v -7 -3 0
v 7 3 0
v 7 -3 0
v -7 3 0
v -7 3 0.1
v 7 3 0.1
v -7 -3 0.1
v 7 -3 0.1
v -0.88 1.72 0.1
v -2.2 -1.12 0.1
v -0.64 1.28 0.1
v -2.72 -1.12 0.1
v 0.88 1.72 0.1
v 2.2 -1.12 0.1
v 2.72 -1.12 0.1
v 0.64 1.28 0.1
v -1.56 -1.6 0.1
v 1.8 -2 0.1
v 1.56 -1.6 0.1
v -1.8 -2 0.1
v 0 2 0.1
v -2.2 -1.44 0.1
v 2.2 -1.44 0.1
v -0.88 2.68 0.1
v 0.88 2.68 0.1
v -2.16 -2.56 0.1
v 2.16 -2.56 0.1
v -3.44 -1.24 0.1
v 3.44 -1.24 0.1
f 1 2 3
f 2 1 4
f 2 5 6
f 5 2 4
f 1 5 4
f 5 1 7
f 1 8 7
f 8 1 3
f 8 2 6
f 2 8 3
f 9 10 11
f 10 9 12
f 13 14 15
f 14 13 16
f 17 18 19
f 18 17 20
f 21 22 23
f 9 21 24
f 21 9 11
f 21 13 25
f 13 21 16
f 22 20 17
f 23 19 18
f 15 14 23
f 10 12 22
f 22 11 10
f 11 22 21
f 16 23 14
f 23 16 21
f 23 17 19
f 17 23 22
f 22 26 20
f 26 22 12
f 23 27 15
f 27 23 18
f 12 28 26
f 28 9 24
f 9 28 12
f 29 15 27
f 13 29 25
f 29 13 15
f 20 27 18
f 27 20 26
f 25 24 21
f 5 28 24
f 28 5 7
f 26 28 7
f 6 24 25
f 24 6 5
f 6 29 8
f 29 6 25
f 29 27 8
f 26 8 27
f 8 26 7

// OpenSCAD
// file: ../p/4-4edge.scad
use <../lib.scad>
$fa=1; $fs=0.2;
function ldraw_lib__4_4edge(realsolid=false) = [
// 0 Circle 1.0
// 0 Name: 4-4edge.dat
// 0 Author: James Jessiman
// 0 !LDRAW_ORG Primitive UPDATE 2017-01
// 0 !LICENSE Licensed under CC BY 2.0 and CC BY 4.0 : see CAreadme.txt
// 
// 0 BFC CERTIFY CCW
  [0,"BFC","CERTIFY"],
  [0,"BFC","CCW"],
// 
// 0 !HISTORY 1998-12-15 [PTadmin] Official Update 1998-10
// 0 !HISTORY 2005-12-28 [PTadmin] Official Update 2005-01
// 0 !HISTORY 2007-06-24 [PTadmin] Header formatted for Contributor Agreement
// 0 !HISTORY 2008-07-01 [PTadmin] Official Update 2008-01
// 0 !HISTORY 2017-01-15 [Steffen] BFCed
// 0 !HISTORY 2017-12-30 [PTadmin] Official Update 2017-01
// 
// 
// 2 24 1 0 0 0.9239 0 0.3827
  [2,24,1,0,0,0.9239,0,0.3827],
// 2 24 0.9239 0 0.3827 0.7071 0 0.7071
  [2,24,0.9239,0,0.3827,0.7071,0,0.7071],
// 2 24 0.7071 0 0.7071 0.3827 0 0.9239
  [2,24,0.7071,0,0.7071,0.3827,0,0.9239],
// 2 24 0.3827 0 0.9239 0 0 1
  [2,24,0.3827,0,0.9239,0,0,1],
// 2 24 0 0 1 -0.3827 0 0.9239
  [2,24,0,0,1,-0.3827,0,0.9239],
// 2 24 -0.3827 0 0.9239 -0.7071 0 0.7071
  [2,24,-0.3827,0,0.9239,-0.7071,0,0.7071],
// 2 24 -0.7071 0 0.7071 -0.9239 0 0.3827
  [2,24,-0.7071,0,0.7071,-0.9239,0,0.3827],
// 2 24 -0.9239 0 0.3827 -1 0 -0
  [2,24,-0.9239,0,0.3827,-1,0,-0],
// 2 24 -1 0 -0 -0.9239 0 -0.3827
  [2,24,-1,0,-0,-0.9239,0,-0.3827],
// 2 24 -0.9239 0 -0.3827 -0.7071 0 -0.7071
  [2,24,-0.9239,0,-0.3827,-0.7071,0,-0.7071],
// 2 24 -0.7071 0 -0.7071 -0.3827 0 -0.9239
  [2,24,-0.7071,0,-0.7071,-0.3827,0,-0.9239],
// 2 24 -0.3827 0 -0.9239 0 0 -1
  [2,24,-0.3827,0,-0.9239,0,0,-1],
// 2 24 0 0 -1 0.3827 0 -0.9239
  [2,24,0,0,-1,0.3827,0,-0.9239],
// 2 24 0.3827 0 -0.9239 0.7071 0 -0.7071
  [2,24,0.3827,0,-0.9239,0.7071,0,-0.7071],
// 2 24 0.7071 0 -0.7071 0.9239 0 -0.3827
  [2,24,0.7071,0,-0.7071,0.9239,0,-0.3827],
// 2 24 0.9239 0 -0.3827 1 0 0
  [2,24,0.9239,0,-0.3827,1,0,0],
];
module ldraw_lib__4_4edge(step=0, col=false, unit=2/5, alt=false, line=0.2, solid=!$preview)
    makepoly(ldraw_lib__4_4edge(solid), step=step, col=col, unit=unit, alt=alt, line=line, solid=solid);
ldraw_lib__4_4edge(line=0.2);
// file: ../p/4-4disc.scad
use <../lib.scad>
$fa=1; $fs=0.2;
function ldraw_lib__4_4disc(realsolid=false) = [
// 0 Disc 1.0
// 0 Name: 4-4disc.dat
// 0 Author: James Jessiman
// 0 !LDRAW_ORG Primitive UPDATE 2002-02
// 0 !LICENSE Licensed under CC BY 2.0 and CC BY 4.0 : see CAreadme.txt
// 
// 0 BFC CERTIFY CCW
  [0,"BFC","CERTIFY"],
  [0,"BFC","CCW"],
// 
// 0 !HISTORY 1998-12-15 [PTadmin] Official Update 1998-10
// 0 !HISTORY 2002-03-23 [sbliss] Added BFC statement
// 0 !HISTORY 2002-04-25 [PTadmin] Official Update 2002-02
// 0 !HISTORY 2007-06-24 [PTadmin] Header formatted for Contributor Agreement
// 0 !HISTORY 2008-07-01 [PTadmin] Official Update 2008-01
// 
// 
// 3 16 0 0 0 1 0 0 0.9239 0 0.3827
  [3,16,0,0,0,1,0,0,0.9239,0,0.3827],
// 3 16 0 0 0 0.9239 0 0.3827 0.7071 0 0.7071
  [3,16,0,0,0,0.9239,0,0.3827,0.7071,0,0.7071],
// 3 16 0 0 0 0.7071 0 0.7071 0.3827 0 0.9239
  [3,16,0,0,0,0.7071,0,0.7071,0.3827,0,0.9239],
// 3 16 0 0 0 0.3827 0 0.9239 0 0 1
  [3,16,0,0,0,0.3827,0,0.9239,0,0,1],
// 3 16 0 0 0 0 0 1 -0.3827 0 0.9239
  [3,16,0,0,0,0,0,1,-0.3827,0,0.9239],
// 3 16 0 0 0 -0.3827 0 0.9239 -0.7071 0 0.7071
  [3,16,0,0,0,-0.3827,0,0.9239,-0.7071,0,0.7071],
// 3 16 0 0 0 -0.7071 0 0.7071 -0.9239 0 0.3827
  [3,16,0,0,0,-0.7071,0,0.7071,-0.9239,0,0.3827],
// 3 16 0 0 0 -0.9239 0 0.3827 -1 0 -0
  [3,16,0,0,0,-0.9239,0,0.3827,-1,0,-0],
// 3 16 0 0 0 -1 0 -0 -0.9239 0 -0.3827
  [3,16,0,0,0,-1,0,-0,-0.9239,0,-0.3827],
// 3 16 0 0 0 -0.9239 0 -0.3827 -0.7071 0 -0.7071
  [3,16,0,0,0,-0.9239,0,-0.3827,-0.7071,0,-0.7071],
// 3 16 0 0 0 -0.7071 0 -0.7071 -0.3827 0 -0.9239
  [3,16,0,0,0,-0.7071,0,-0.7071,-0.3827,0,-0.9239],
// 3 16 0 0 0 -0.3827 0 -0.9239 0 0 -1
  [3,16,0,0,0,-0.3827,0,-0.9239,0,0,-1],
// 3 16 0 0 0 0 0 -1 0.3827 0 -0.9239
  [3,16,0,0,0,0,0,-1,0.3827,0,-0.9239],
// 3 16 0 0 0 0.3827 0 -0.9239 0.7071 0 -0.7071
  [3,16,0,0,0,0.3827,0,-0.9239,0.7071,0,-0.7071],
// 3 16 0 0 0 0.7071 0 -0.7071 0.9239 0 -0.3827
  [3,16,0,0,0,0.7071,0,-0.7071,0.9239,0,-0.3827],
// 3 16 0 0 0 0.9239 0 -0.3827 1 0 0
  [3,16,0,0,0,0.9239,0,-0.3827,1,0,0],
// 0
];
module ldraw_lib__4_4disc(step=0, col=false, unit=2/5, alt=false, line=0.2, solid=!$preview)
    makepoly(ldraw_lib__4_4disc(solid), step=step, col=col, unit=unit, alt=alt, line=line, solid=solid);
ldraw_lib__4_4disc(line=0.2);
// file: ../p/4-4cyli.scad
use <../lib.scad>
$fa=1; $fs=0.2;
function ldraw_lib__4_4cyli(realsolid=false) = [
// 0 Cylinder 1.0
// 0 Name: 4-4cyli.dat
// 0 Author: James Jessiman
// 0 !LDRAW_ORG Primitive UPDATE 2005-01
// 0 !LICENSE Licensed under CC BY 2.0 and CC BY 4.0 : see CAreadme.txt
// 
// 0 BFC CERTIFY CCW
  [0,"BFC","CERTIFY"],
  [0,"BFC","CCW"],
// 
// 0 !HISTORY 1998-12-15 [PTadmin] Official Update 1998-10
// 0 !HISTORY 2002-03-23 [sbliss] Added BFC statement; merged headers from files in distributions LDraw 0.27 and Complete.
// 0 !HISTORY 2002-04-25 [PTadmin] Official Update 2002-02
// 0 !HISTORY 2004-12-14 [guyvivan] BFC CCW
// 0 !HISTORY 2005-12-28 [PTadmin] Official Update 2005-01
// 0 !HISTORY 2007-06-24 [PTadmin] Header formatted for Contributor Agreement
// 0 !HISTORY 2008-07-01 [PTadmin] Official Update 2008-01
// 
// 
// 4 16 1 1 0 0.9239 1 0.3827 0.9239 0 0.3827 1 0 0
  [4,16,1,1,0,0.9239,1,0.3827,0.9239,0,0.3827,1,0,0],
// 5 24 1 0 0 1 1 0 0.9239 0 0.3827 0.9239 0 -0.3827
  [5,24,1,0,0,1,1,0,0.9239,0,0.3827,0.9239,0,-0.3827],
// 4 16 0.9239 1 0.3827 0.7071 1 0.7071 0.7071 0 0.7071 0.9239 0 0.3827
  [4,16,0.9239,1,0.3827,0.7071,1,0.7071,0.7071,0,0.7071,0.9239,0,0.3827],
// 5 24 0.9239 0 0.3827 0.9239 1 0.3827 0.7071 0 0.7071 1 0 0
  [5,24,0.9239,0,0.3827,0.9239,1,0.3827,0.7071,0,0.7071,1,0,0],
// 4 16 0.7071 1 0.7071 0.3827 1 0.9239 0.3827 0 0.9239 0.7071 0 0.7071
  [4,16,0.7071,1,0.7071,0.3827,1,0.9239,0.3827,0,0.9239,0.7071,0,0.7071],
// 5 24 0.7071 0 0.7071 0.7071 1 0.7071 0.3827 0 0.9239 0.9239 0 0.3827
  [5,24,0.7071,0,0.7071,0.7071,1,0.7071,0.3827,0,0.9239,0.9239,0,0.3827],
// 4 16 0.3827 1 0.9239 0 1 1 0 0 1 0.3827 0 0.9239
  [4,16,0.3827,1,0.9239,0,1,1,0,0,1,0.3827,0,0.9239],
// 5 24 0.3827 0 0.9239 0.3827 1 0.9239 0 0 1 0.7071 0 0.7071
  [5,24,0.3827,0,0.9239,0.3827,1,0.9239,0,0,1,0.7071,0,0.7071],
// 4 16 0 1 1 -0.3827 1 0.9239 -0.3827 0 0.9239 0 0 1
  [4,16,0,1,1,-0.3827,1,0.9239,-0.3827,0,0.9239,0,0,1],
// 5 24 0 0 1 0 1 1 -0.3827 0 0.9239 0.3827 0 0.9239
  [5,24,0,0,1,0,1,1,-0.3827,0,0.9239,0.3827,0,0.9239],
// 4 16 -0.3827 1 0.9239 -0.7071 1 0.7071 -0.7071 0 0.7071 -0.3827 0 0.9239
  [4,16,-0.3827,1,0.9239,-0.7071,1,0.7071,-0.7071,0,0.7071,-0.3827,0,0.9239],
// 5 24 -0.3827 0 0.9239 -0.3827 1 0.9239 -0.7071 0 0.7071 0 0 1
  [5,24,-0.3827,0,0.9239,-0.3827,1,0.9239,-0.7071,0,0.7071,0,0,1],
// 4 16 -0.7071 1 0.7071 -0.9239 1 0.3827 -0.9239 0 0.3827 -0.7071 0 0.7071
  [4,16,-0.7071,1,0.7071,-0.9239,1,0.3827,-0.9239,0,0.3827,-0.7071,0,0.7071],
// 5 24 -0.7071 0 0.7071 -0.7071 1 0.7071 -0.9239 0 0.3827 -0.3827 0 0.9239
  [5,24,-0.7071,0,0.7071,-0.7071,1,0.7071,-0.9239,0,0.3827,-0.3827,0,0.9239],
// 4 16 -0.9239 1 0.3827 -1 1 0 -1 0 0 -0.9239 0 0.3827
  [4,16,-0.9239,1,0.3827,-1,1,0,-1,0,0,-0.9239,0,0.3827],
// 5 24 -0.9239 0 0.3827 -0.9239 1 0.3827 -1 0 0 -0.7071 0 0.7071
  [5,24,-0.9239,0,0.3827,-0.9239,1,0.3827,-1,0,0,-0.7071,0,0.7071],
// 4 16 -1 1 0 -0.9239 1 -0.3827 -0.9239 0 -0.3827 -1 0 0
  [4,16,-1,1,0,-0.9239,1,-0.3827,-0.9239,0,-0.3827,-1,0,0],
// 5 24 -1 0 0 -1 1 0 -0.9239 0 -0.3827 -0.9239 0 0.3827
  [5,24,-1,0,0,-1,1,0,-0.9239,0,-0.3827,-0.9239,0,0.3827],
// 4 16 -0.9239 1 -0.3827 -0.7071 1 -0.7071 -0.7071 0 -0.7071 -0.9239 0 -0.3827
  [4,16,-0.9239,1,-0.3827,-0.7071,1,-0.7071,-0.7071,0,-0.7071,-0.9239,0,-0.3827],
// 5 24 -0.9239 0 -0.3827 -0.9239 1 -0.3827 -0.7071 0 -0.7071 -1 0 0
  [5,24,-0.9239,0,-0.3827,-0.9239,1,-0.3827,-0.7071,0,-0.7071,-1,0,0],
// 4 16 -0.7071 1 -0.7071 -0.3827 1 -0.9239 -0.3827 0 -0.9239 -0.7071 0 -0.7071
  [4,16,-0.7071,1,-0.7071,-0.3827,1,-0.9239,-0.3827,0,-0.9239,-0.7071,0,-0.7071],
// 5 24 -0.7071 0 -0.7071 -0.7071 1 -0.7071 -0.3827 0 -0.9239 -0.9239 0 -0.3827
  [5,24,-0.7071,0,-0.7071,-0.7071,1,-0.7071,-0.3827,0,-0.9239,-0.9239,0,-0.3827],
// 4 16 -0.3827 1 -0.9239 0 1 -1 0 0 -1 -0.3827 0 -0.9239
  [4,16,-0.3827,1,-0.9239,0,1,-1,0,0,-1,-0.3827,0,-0.9239],
// 5 24 -0.3827 0 -0.9239 -0.3827 1 -0.9239 0 0 -1 -0.7071 0 -0.7071
  [5,24,-0.3827,0,-0.9239,-0.3827,1,-0.9239,0,0,-1,-0.7071,0,-0.7071],
// 4 16 0 1 -1 0.3827 1 -0.9239 0.3827 0 -0.9239 0 0 -1
  [4,16,0,1,-1,0.3827,1,-0.9239,0.3827,0,-0.9239,0,0,-1],
// 5 24 0 0 -1 0 1 -1 0.3827 0 -0.9239 -0.3827 0 -0.9239
  [5,24,0,0,-1,0,1,-1,0.3827,0,-0.9239,-0.3827,0,-0.9239],
// 4 16 0.3827 1 -0.9239 0.7071 1 -0.7071 0.7071 0 -0.7071 0.3827 0 -0.9239
  [4,16,0.3827,1,-0.9239,0.7071,1,-0.7071,0.7071,0,-0.7071,0.3827,0,-0.9239],
// 5 24 0.3827 0 -0.9239 0.3827 1 -0.9239 0.7071 0 -0.7071 0 0 -1
  [5,24,0.3827,0,-0.9239,0.3827,1,-0.9239,0.7071,0,-0.7071,0,0,-1],
// 4 16 0.7071 1 -0.7071 0.9239 1 -0.3827 0.9239 0 -0.3827 0.7071 0 -0.7071
  [4,16,0.7071,1,-0.7071,0.9239,1,-0.3827,0.9239,0,-0.3827,0.7071,0,-0.7071],
// 5 24 0.7071 0 -0.7071 0.7071 1 -0.7071 0.9239 0 -0.3827 0.3827 0 -0.9239
  [5,24,0.7071,0,-0.7071,0.7071,1,-0.7071,0.9239,0,-0.3827,0.3827,0,-0.9239],
// 4 16 0.9239 1 -0.3827 1 1 0 1 0 0 0.9239 0 -0.3827
  [4,16,0.9239,1,-0.3827,1,1,0,1,0,0,0.9239,0,-0.3827],
// 5 24 0.9239 0 -0.3827 0.9239 1 -0.3827 1 0 0 0.7071 0 -0.7071
  [5,24,0.9239,0,-0.3827,0.9239,1,-0.3827,1,0,0,0.7071,0,-0.7071],
// 0
];
module ldraw_lib__4_4cyli(step=0, col=false, unit=2/5, alt=false, line=0.2, solid=!$preview)
    makepoly(ldraw_lib__4_4cyli(solid), step=step, col=col, unit=unit, alt=alt, line=line, solid=solid);
ldraw_lib__4_4cyli(line=0.2);
// file: ../p/stud3.scad
use <../lib.scad>
use <4-4cyli.scad>
use <4-4disc.scad>
use <4-4edge.scad>
$fa=1; $fs=0.2;
function ldraw_lib__stud3(realsolid=false) = realsolid ? 
    [openscad(translate([0,0,-eps()], o=cylinder(4+eps(), r=4)),2)] : [
// 0 Stud Tube Solid
// 0 Name: stud3.dat
// 0 Author: James Jessiman
// 0 !LDRAW_ORG Primitive UPDATE 2012-01
// 0 !LICENSE Licensed under CC BY 2.0 and CC BY 4.0 : see CAreadme.txt
// 
// 0 BFC CERTIFY CCW
  [0,"BFC","CERTIFY"],
  [0,"BFC","CCW"],
// 
// 0 !HISTORY 2002-04-04 [sbliss] Modified for BFC compliance
// 0 !HISTORY 2002-04-25 [PTadmin] Official Update 2002-02
// 0 !HISTORY 2007-06-24 [PTadmin] Header formatted for Contributor Agreement
// 0 !HISTORY 2008-07-01 [PTadmin] Official Update 2008-01
// 0 !HISTORY 2012-02-16 [Philo] Changed to CCW
// 0 !HISTORY 2012-03-30 [PTadmin] Official Update 2012-01
// 
// 
// 1 16 0 -4 0 4 0 0 0 1 0 0 0 4 4-4edge.dat
  [1,16,0,-4,0,4,0,0,0,1,0,0,0,4, ldraw_lib__4_4edge(realsolid)],
// 1 16 0 0 0 4 0 0 0 1 0 0 0 4 4-4edge.dat
  [1,16,0,0,0,4,0,0,0,1,0,0,0,4, ldraw_lib__4_4edge(realsolid)],
// 1 16 0 -4 0 4 0 0 0 1 0 0 0 4 4-4disc.dat
  [1,16,0,-4,0,4,0,0,0,1,0,0,0,4, ldraw_lib__4_4disc(realsolid)],
// 1 16 0 -4 0 4 0 0 0 4 0 0 0 4 4-4cyli.dat
  [1,16,0,-4,0,4,0,0,0,4,0,0,0,4, ldraw_lib__4_4cyli(realsolid)],
];
module ldraw_lib__stud3(step=0, col=false, unit=2/5, alt=false, line=0.2, solid=!$preview)
    makepoly(ldraw_lib__stud3(solid), step=step, col=col, unit=unit, alt=alt, line=line, solid=solid);
ldraw_lib__stud3(line=0.2);
// file: ../p/stud.scad
use <../lib.scad>
use <4-4cyli.scad>
use <4-4disc.scad>
use <4-4edge.scad>
$fa=1; $fs=0.2;
function ldraw_lib__stud(realsolid=false) = realsolid ? 
    [openscad(translate([0,0,-eps()], o=cylinder(4+eps(), r=6)),2)] : [
// 0 Stud
// 0 Name: stud.dat
// 0 Author: James Jessiman
// 0 !LDRAW_ORG Primitive UPDATE 2012-01
// 0 !LICENSE Licensed under CC BY 2.0 and CC BY 4.0 : see CAreadme.txt
// 
// 0 BFC CERTIFY CCW
  [0,"BFC","CERTIFY"],
  [0,"BFC","CCW"],
// 
// 0 !HISTORY 2002-04-04 [sbliss] Modified for BFC compliance
// 0 !HISTORY 2002-04-25 [PTadmin] Official Update 2002-02
// 0 !HISTORY 2007-06-24 [PTadmin] Header formatted for Contributor Agreement
// 0 !HISTORY 2008-07-01 [PTadmin] Official Update 2008-01
// 0 !HISTORY 2012-02-16 [Philo] Changed to CCW
// 0 !HISTORY 2012-03-30 [PTadmin] Official Update 2012-01
// 
// 
// 1 16 0 0 0 6 0 0 0 1 0 0 0 6 4-4edge.dat
  [1,16,0,0,0,6,0,0,0,1,0,0,0,6, ldraw_lib__4_4edge(realsolid)],
// 1 16 0 -4 0 6 0 0 0 1 0 0 0 6 4-4edge.dat
  [1,16,0,-4,0,6,0,0,0,1,0,0,0,6, ldraw_lib__4_4edge(realsolid)],
// 1 16 0 0 0 6 0 0 0 -4 0 0 0 6 4-4cyli.dat
  [1,16,0,0,0,6,0,0,0,-4,0,0,0,6, ldraw_lib__4_4cyli(realsolid)],
// 1 16 0 -4 0 6 0 0 0 1 0 0 0 6 4-4disc.dat
  [1,16,0,-4,0,6,0,0,0,1,0,0,0,6, ldraw_lib__4_4disc(realsolid)],
];
module ldraw_lib__stud(step=0, col=false, unit=2/5, alt=false, line=0.2, solid=!$preview)
    makepoly(ldraw_lib__stud(solid), step=step, col=col, unit=unit, alt=alt, line=line, solid=solid);
ldraw_lib__stud(line=0.2);
// file: ../p/box5.scad
use <../lib.scad>
$fa=1; $fs=0.2;
function ldraw_lib__box5(realsolid=false) = [
// 0 Box with 5 Faces and All Edges
// 0 Name: box5.dat
// 0 Author: James Jessiman
// 0 !LDRAW_ORG Primitive UPDATE 2012-01
// 0 !LICENSE Licensed under CC BY 2.0 and CC BY 4.0 : see CAreadme.txt
// 
// 0 BFC CERTIFY CCW
  [0,"BFC","CERTIFY"],
  [0,"BFC","CCW"],
// 
// 0 !HISTORY 2002-04-03 [sbliss] Modified for BFC compliance
// 0 !HISTORY 2002-04-25 [PTadmin] Official Update 2002-02
// 0 !HISTORY 2007-06-24 [PTadmin] Header formatted for Contributor Agreement
// 0 !HISTORY 2008-07-01 [PTadmin] Official Update 2008-01
// 0 !HISTORY 2012-02-16 [Philo] Changed to CCW
// 0 !HISTORY 2012-03-30 [PTadmin] Official Update 2012-01
// 
// 
// 2 24 1 1 1 -1 1 1
  [2,24,1,1,1,-1,1,1],
// 2 24 -1 1 1 -1 1 -1
  [2,24,-1,1,1,-1,1,-1],
// 2 24 -1 1 -1 1 1 -1
  [2,24,-1,1,-1,1,1,-1],
// 2 24 1 1 -1 1 1 1
  [2,24,1,1,-1,1,1,1],
// 2 24 1 0 1 -1 0 1
  [2,24,1,0,1,-1,0,1],
// 2 24 -1 0 1 -1 0 -1
  [2,24,-1,0,1,-1,0,-1],
// 2 24 -1 0 -1 1 0 -1
  [2,24,-1,0,-1,1,0,-1],
// 2 24 1 0 -1 1 0 1
  [2,24,1,0,-1,1,0,1],
// 2 24 1 0 1 1 1 1
  [2,24,1,0,1,1,1,1],
// 2 24 -1 0 1 -1 1 1
  [2,24,-1,0,1,-1,1,1],
// 2 24 1 0 -1 1 1 -1
  [2,24,1,0,-1,1,1,-1],
// 2 24 -1 0 -1 -1 1 -1
  [2,24,-1,0,-1,-1,1,-1],
// 4 16 -1 1 1 1 1 1 1 1 -1 -1 1 -1
  [4,16,-1,1,1,1,1,1,1,1,-1,-1,1,-1],
// 4 16 -1 1 1 -1 0 1 1 0 1 1 1 1
  [4,16,-1,1,1,-1,0,1,1,0,1,1,1,1],
// 4 16 -1 1 -1 -1 0 -1 -1 0 1 -1 1 1
  [4,16,-1,1,-1,-1,0,-1,-1,0,1,-1,1,1],
// 4 16 1 1 -1 1 0 -1 -1 0 -1 -1 1 -1
  [4,16,1,1,-1,1,0,-1,-1,0,-1,-1,1,-1],
// 4 16 1 1 1 1 0 1 1 0 -1 1 1 -1
  [4,16,1,1,1,1,0,1,1,0,-1,1,1,-1],
];
module ldraw_lib__box5(step=0, col=false, unit=2/5, alt=false, line=0.2, solid=!$preview)
    makepoly(ldraw_lib__box5(solid), step=step, col=col, unit=unit, alt=alt, line=line, solid=solid);
ldraw_lib__box5(line=0.2);
// file: ../p/box4t.scad
use <../lib.scad>
$fa=1; $fs=0.2;
function ldraw_lib__box4t(realsolid=false) = [
// 0 Box with 4 Adjacent Faces and All Edges
// 0 Name: box4t.dat
// 0 Author: Tore Eriksson [Tore_Eriksson]
// 0 !LDRAW_ORG Primitive UPDATE 2003-02
// 0 !LICENSE Licensed under CC BY 2.0 and CC BY 4.0 : see CAreadme.txt
// 
// 0 BFC CERTIFY CCW
  [0,"BFC","CERTIFY"],
  [0,"BFC","CCW"],
// 
// 0 !HISTORY 1997-09-29 [PTadmin] Official Update 1997-15
// 0 !HISTORY 2002-08-31 [izanette] Modified with WINDZ for BFC compliance
// 0 !HISTORY 2003-08-01 [PTadmin] Official Update 2003-02
// 0 !HISTORY 2007-06-24 [PTadmin] Header formatted for Contributor Agreement
// 0 !HISTORY 2008-07-01 [PTadmin] Official Update 2008-01
// 
// 
// 2 24 1 1 1 -1 1 1
  [2,24,1,1,1,-1,1,1],
// 2 24 -1 1 1 -1 1 -1
  [2,24,-1,1,1,-1,1,-1],
// 2 24 -1 1 -1 1 1 -1
  [2,24,-1,1,-1,1,1,-1],
// 2 24 1 1 -1 1 1 1
  [2,24,1,1,-1,1,1,1],
// 2 24 1 0 1 -1 0 1
  [2,24,1,0,1,-1,0,1],
// 2 24 -1 0 1 -1 0 -1
  [2,24,-1,0,1,-1,0,-1],
// 2 24 -1 0 -1 1 0 -1
  [2,24,-1,0,-1,1,0,-1],
// 2 24 1 0 -1 1 0 1
  [2,24,1,0,-1,1,0,1],
// 2 24 1 0 1 1 1 1
  [2,24,1,0,1,1,1,1],
// 2 24 -1 0 1 -1 1 1
  [2,24,-1,0,1,-1,1,1],
// 2 24 1 0 -1 1 1 -1
  [2,24,1,0,-1,1,1,-1],
// 2 24 -1 0 -1 -1 1 -1
  [2,24,-1,0,-1,-1,1,-1],
// 4 16 1 1 1 1 1 -1 -1 1 -1 -1 1 1
  [4,16,1,1,1,1,1,-1,-1,1,-1,-1,1,1],
// 4 16 1 1 1 -1 1 1 -1 0 1 1 0 1
  [4,16,1,1,1,-1,1,1,-1,0,1,1,0,1],
// 4 16 -1 1 1 -1 1 -1 -1 0 -1 -1 0 1
  [4,16,-1,1,1,-1,1,-1,-1,0,-1,-1,0,1],
// 0 4 16 -1 1 -1 -1 0 -1 1 0 -1 1 1 -1
// 4 16 1 1 -1 1 1 1 1 0 1 1 0 -1
  [4,16,1,1,-1,1,1,1,1,0,1,1,0,-1],
// 0
];
module ldraw_lib__box4t(step=0, col=false, unit=2/5, alt=false, line=0.2, solid=!$preview)
    makepoly(ldraw_lib__box4t(solid), step=step, col=col, unit=unit, alt=alt, line=line, solid=solid);
ldraw_lib__box4t(line=0.2);
// file: s/3004s01.scad
use <../../lib.scad>
use <../../p/box4t.scad>
use <../../p/box5.scad>
use <../../p/stud.scad>
use <../../p/stud3.scad>
$fa=1; $fs=0.2;
function ldraw_lib__s__3004s01(realsolid=false) = [
// 0 ~Brick  1 x  2 without Front Face
// 0 Name: s\3004s01.dat
// 0 Author: James Jessiman
// 0 !LDRAW_ORG Subpart UPDATE 2003-03
// 0 !LICENSE Licensed under CC BY 2.0 and CC BY 4.0 : see CAreadme.txt
// 
// 0 BFC CERTIFY CCW
  [0,"BFC","CERTIFY"],
  [0,"BFC","CCW"],
// 
// 0 !HISTORY 2003-09-07 [jriley] Subfiling, BFC
// 0 !HISTORY 2003-12-19 [PTadmin] Official Update 2003-03
// 0 !HISTORY 2007-08-29 [PTadmin] Header formatted for Contributor Agreement
// 0 !HISTORY 2008-07-01 [PTadmin] Official Update 2008-01
// 
// 
// 1 16 0 4 0 1 0 0 0 -5 0 0 0 1 stud3.dat
  [1,16,0,4,0,1,0,0,0,-5,0,0,0,1, ldraw_lib__stud3(realsolid)],
// 0 BFC INVERTNEXT
  [0,"BFC","INVERTNEXT"],
// 1 16 0 24 0 16 0 0 0 -20 0 0 0 6 box5.dat
  [1,16,0,24,0,16,0,0,0,-20,0,0,0,6, ldraw_lib__box5(realsolid)],
// 4 16 20 24 10 16 24 6 -16 24 6 -20 24 10
  [4,16,20,24,10,16,24,6,-16,24,6,-20,24,10],
// 4 16 -20 24 10 -16 24 6 -16 24 -6 -20 24 -10
  [4,16,-20,24,10,-16,24,6,-16,24,-6,-20,24,-10],
// 4 16 -20 24 -10 -16 24 -6 16 24 -6 20 24 -10
  [4,16,-20,24,-10,-16,24,-6,16,24,-6,20,24,-10],
// 4 16 20 24 -10 16 24 -6 16 24 6 20 24 10
  [4,16,20,24,-10,16,24,-6,16,24,6,20,24,10],
// 1 16 0 24 0 20 0 0 0 -24 0 0 0 10 box4t.dat
  [1,16,0,24,0,20,0,0,0,-24,0,0,0,10, ldraw_lib__box4t(realsolid)],
// 1 16 10 0 0 1 0 0 0 1 0 0 0 1 stud.dat
  [1,16,10,0,0,1,0,0,0,1,0,0,0,1, ldraw_lib__stud(realsolid)],
// 1 16 -10 0 0 1 0 0 0 1 0 0 0 1 stud.dat
  [1,16,-10,0,0,1,0,0,0,1,0,0,0,1, ldraw_lib__stud(realsolid)],
// 0
];
module ldraw_lib__s__3004s01(step=0, col=false, unit=2/5, alt=false, line=0.2, solid=!$preview)
    makepoly(ldraw_lib__s__3004s01(solid), step=step, col=col, unit=unit, alt=alt, line=line, solid=solid);
ldraw_lib__s__3004s01(line=0.2);
// file: 3004.scad
use <../lib.scad>
use <s/3004s01.scad>
$fa=1; $fs=0.2;
function ldraw_lib__3004(realsolid=false) = [
// 0 Brick  1 x  2
// 0 Name: 3004.dat
// 0 Author: James Jessiman
// 0 !LDRAW_ORG Part UPDATE 2022-05
// 0 !LICENSE Licensed under CC BY 2.0 and CC BY 4.0 : see CAreadme.txt
// 
// 0 BFC CERTIFY CCW
  [0,"BFC","CERTIFY"],
  [0,"BFC","CCW"],
// 
// 0 !HISTORY 2001-10-26 [PTadmin] Official Update 2001-01
// 0 !HISTORY 2002-05-07 {unknown} BFC Certification
// 0 !HISTORY 2002-06-11 [PTadmin] Official Update 2002-03
// 0 !HISTORY 2007-05-07 [PTadmin] Header formatted for Contributor Agreement
// 0 !HISTORY 2008-07-01 [PTadmin] Official Update 2008-01
// 0 !HISTORY 2022-08-04 [MagFors] Using subfile
// 0 !HISTORY 2022-09-15 [PTadmin] Official Update 2022-05
// 
// 
// 1 16 0 0 0 1 0 0 0 1 0 0 0 1 s\3004s01.dat
  [1,16,0,0,0,1,0,0,0,1,0,0,0,1, ldraw_lib__s__3004s01(realsolid)],
// 4 16 -20 24 -10 20 24 -10 20 0 -10 -20 0 -10
  [4,16,-20,24,-10,20,24,-10,20,0,-10,-20,0,-10],
];
module ldraw_lib__3004(step=0, col=false, unit=2/5, alt=false, line=0.2, solid=!$preview)
    makepoly(ldraw_lib__3004(solid), step=step, col=col, unit=unit, alt=alt, line=line, solid=solid);
ldraw_lib__3004(line=0.2);
// file: ../p/box5-12.scad
use <../lib.scad>
$fa=1; $fs=0.2;
function ldraw_lib__box5_12(realsolid=false) = [
// 0 Box with 5 Faces without Any Edges
// 0 Name: box5-12.dat
// 0 Author: Chris Dee [cwdee]
// 0 !LDRAW_ORG Primitive UPDATE 2009-02
// 0 !LICENSE Licensed under CC BY 2.0 and CC BY 4.0 : see CAreadme.txt
// 
// 0 BFC CERTIFY CCW
  [0,"BFC","CERTIFY"],
  [0,"BFC","CCW"],
// 
// 0 !HISTORY 2009-09-03 [PTadmin] Official Update 2009-02
// 
// 
// 4 16 1 1 1 1 1 -1 -1 1 -1 -1 1 1
  [4,16,1,1,1,1,1,-1,-1,1,-1,-1,1,1],
// 4 16 -1 0 1 1 0 1 1 1 1 -1 1 1
  [4,16,-1,0,1,1,0,1,1,1,1,-1,1,1],
// 4 16 -1 0 -1 -1 0 1 -1 1 1 -1 1 -1
  [4,16,-1,0,-1,-1,0,1,-1,1,1,-1,1,-1],
// 4 16 1 0 -1 -1 0 -1 -1 1 -1 1 1 -1
  [4,16,1,0,-1,-1,0,-1,-1,1,-1,1,1,-1],
// 4 16 1 0 1 1 0 -1 1 1 -1 1 1 1
  [4,16,1,0,1,1,0,-1,1,1,-1,1,1,1],
// 0
];
module ldraw_lib__box5_12(step=0, col=false, unit=2/5, alt=false, line=0.2, solid=!$preview)
    makepoly(ldraw_lib__box5_12(solid), step=step, col=col, unit=unit, alt=alt, line=line, solid=solid);
ldraw_lib__box5_12(line=0.2);
// main file
use <../lib.scad>
use <../p/box5-12.scad>
$fa=1; $fs=0.2;
function ldraw_lib__6299663b(realsolid=false) = [
// 0 Sticker  0.7 x  1.7 with Red and White Triangle on Dark Red Background
// 0 Name: 6299663b.dat
// 0 Author: Evert-Jan Boer [ejboer]
// 0 !LDRAW_ORG Part UPDATE 2020-03
// 0 !LICENSE Licensed under CC BY 2.0 and CC BY 4.0 : see CAreadme.txt
// 
// 0 BFC CERTIFY CCW
  [0,"BFC","CERTIFY"],
  [0,"BFC","CCW"],
// 
// 0 !KEYWORDS A-wing Starfighter UCS, Set 75275
// 
// 0 !HISTORY 2020-12-29 [PTadmin] Official Update 2020-03
// 
// 
// 1 16 0 -0.25 0 17.5 0 0 0 0.25 0 0 0 7.5 box5-12.dat
  [1,16,0,-0.25,0,17.5,0,0,0,0.25,0,0,0,7.5, ldraw_lib__box5_12(realsolid)],
// 
// 4 4 -6.8 -0.25 -2.8 -5.5 -0.25 -2.8 -1.6 -0.25 3.2 -2.2 -0.25 4.3
  [4,4,-6.8,-0.25,-2.8,-5.5,-0.25,-2.8,-1.6,-0.25,3.2,-2.2,-0.25,4.3],
// 4 4 1.6 -0.25 3.2 5.5 -0.25 -2.8 6.8 -0.25 -2.8 2.2 -0.25 4.3
  [4,4,1.6,-0.25,3.2,5.5,-0.25,-2.8,6.8,-0.25,-2.8,2.2,-0.25,4.3],
// 4 4 -3.9 -0.25 -4 -4.5 -0.25 -5 4.5 -0.25 -5 3.9 -0.25 -4
  [4,4,-3.9,-0.25,-4,-4.5,-0.25,-5,4.5,-0.25,-5,3.9,-0.25,-4],
// 3 4 0 -0.25 5 -5.5 -0.25 -3.6 5.5 -0.25 -3.6
  [3,4,0,-0.25,5,-5.5,-0.25,-3.6,5.5,-0.25,-3.6],
// 4 15 -2.2 -0.25 4.3 -1.6 -0.25 3.2 0 -0.25 5 -2.2 -0.25 6.7
  [4,15,-2.2,-0.25,4.3,-1.6,-0.25,3.2,0,-0.25,5,-2.2,-0.25,6.7],
// 4 15 0 -0.25 5 1.6 -0.25 3.2 2.2 -0.25 4.3 2.2 -0.25 6.7
  [4,15,0,-0.25,5,1.6,-0.25,3.2,2.2,-0.25,4.3,2.2,-0.25,6.7],
// 3 15 -5.5 -0.25 -3.6 -4.5 -0.25 -5 -3.9 -0.25 -4
  [3,15,-5.5,-0.25,-3.6,-4.5,-0.25,-5,-3.9,-0.25,-4],
// 3 15 5.5 -0.25 -3.6 3.9 -0.25 -4 4.5 -0.25 -5
  [3,15,5.5,-0.25,-3.6,3.9,-0.25,-4,4.5,-0.25,-5],
// 3 15 6.8 -0.25 -2.8 5.5 -0.25 -2.8 5.5 -0.25 -3.6
  [3,15,6.8,-0.25,-2.8,5.5,-0.25,-2.8,5.5,-0.25,-3.6],
// 3 15 -5.5 -0.25 -2.8 -6.8 -0.25 -2.8 -5.5 -0.25 -3.6
  [3,15,-5.5,-0.25,-2.8,-6.8,-0.25,-2.8,-5.5,-0.25,-3.6],
// 4 15 -1.6 -0.25 3.2 -5.5 -0.25 -2.8 -5.5 -0.25 -3.6 0 -0.25 5
  [4,15,-1.6,-0.25,3.2,-5.5,-0.25,-2.8,-5.5,-0.25,-3.6,0,-0.25,5],
// 4 15 1.6 -0.25 3.2 0 -0.25 5 5.5 -0.25 -3.6 5.5 -0.25 -2.8
  [4,15,1.6,-0.25,3.2,0,-0.25,5,5.5,-0.25,-3.6,5.5,-0.25,-2.8],
// 4 15 -5.5 -0.25 -3.6 -3.9 -0.25 -4 3.9 -0.25 -4 5.5 -0.25 -3.6
  [4,15,-5.5,-0.25,-3.6,-3.9,-0.25,-4,3.9,-0.25,-4,5.5,-0.25,-3.6],
// 4 15 -4.5 -0.25 -5 -5.5 -0.25 -3.6 -6.8 -0.25 -2.8 -5.4 -0.25 -6.4
  [4,15,-4.5,-0.25,-5,-5.5,-0.25,-3.6,-6.8,-0.25,-2.8,-5.4,-0.25,-6.4],
// 4 15 6.8 -0.25 -2.8 5.5 -0.25 -3.6 4.5 -0.25 -5 5.4 -0.25 -6.4
  [4,15,6.8,-0.25,-2.8,5.5,-0.25,-3.6,4.5,-0.25,-5,5.4,-0.25,-6.4],
// 3 15 -6.8 -0.25 -2.8 -8.6 -0.25 -3.1 -5.4 -0.25 -6.4
  [3,15,-6.8,-0.25,-2.8,-8.6,-0.25,-3.1,-5.4,-0.25,-6.4],
// 4 15 -8.6 -0.25 -3.1 -6.8 -0.25 -2.8 -2.2 -0.25 4.3 -2.2 -0.25 6.7
  [4,15,-8.6,-0.25,-3.1,-6.8,-0.25,-2.8,-2.2,-0.25,4.3,-2.2,-0.25,6.7],
// 3 15 8.6 -0.25 -3.1 6.8 -0.25 -2.8 5.4 -0.25 -6.4
  [3,15,8.6,-0.25,-3.1,6.8,-0.25,-2.8,5.4,-0.25,-6.4],
// 4 15 2.2 -0.25 4.3 6.8 -0.25 -2.8 8.6 -0.25 -3.1 2.2 -0.25 6.7
  [4,15,2.2,-0.25,4.3,6.8,-0.25,-2.8,8.6,-0.25,-3.1,2.2,-0.25,6.7],
// 4 15 -4.5 -0.25 -5 -5.4 -0.25 -6.4 5.4 -0.25 -6.4 4.5 -0.25 -5
  [4,15,-4.5,-0.25,-5,-5.4,-0.25,-6.4,5.4,-0.25,-6.4,4.5,-0.25,-5],
// 3 15 2.2 -0.25 6.7 -2.2 -0.25 6.7 0 -0.25 5
  [3,15,2.2,-0.25,6.7,-2.2,-0.25,6.7,0,-0.25,5],
// 4 320 -17.5 -0.25 7.5 -17.5 -0.25 -7.5 -8.6 -0.25 -3.1 -2.2 -0.25 6.7
  [4,320,-17.5,-0.25,7.5,-17.5,-0.25,-7.5,-8.6,-0.25,-3.1,-2.2,-0.25,6.7],
// 3 320 -5.4 -0.25 -6.4 -8.6 -0.25 -3.1 -17.5 -0.25 -7.5
  [3,320,-5.4,-0.25,-6.4,-8.6,-0.25,-3.1,-17.5,-0.25,-7.5],
// 4 320 -17.5 -0.25 7.5 -2.2 -0.25 6.7 2.2 -0.25 6.7 17.5 -0.25 7.5
  [4,320,-17.5,-0.25,7.5,-2.2,-0.25,6.7,2.2,-0.25,6.7,17.5,-0.25,7.5],
// 4 320 17.5 -0.25 7.5 2.2 -0.25 6.7 8.6 -0.25 -3.1 17.5 -0.25 -7.5
  [4,320,17.5,-0.25,7.5,2.2,-0.25,6.7,8.6,-0.25,-3.1,17.5,-0.25,-7.5],
// 3 320 8.6 -0.25 -3.1 5.4 -0.25 -6.4 17.5 -0.25 -7.5
  [3,320,8.6,-0.25,-3.1,5.4,-0.25,-6.4,17.5,-0.25,-7.5],
// 4 320 -5.4 -0.25 -6.4 -17.5 -0.25 -7.5 17.5 -0.25 -7.5 5.4 -0.25 -6.4
  [4,320,-5.4,-0.25,-6.4,-17.5,-0.25,-7.5,17.5,-0.25,-7.5,5.4,-0.25,-6.4],
];
module ldraw_lib__6299663b(step=0, col=false, unit=2/5, alt=false, line=0.2, solid=!$preview)
    makepoly(ldraw_lib__6299663b(solid), step=step, col=col, unit=unit, alt=alt, line=line, solid=solid);
ldraw_lib__6299663b(line=0.2);
